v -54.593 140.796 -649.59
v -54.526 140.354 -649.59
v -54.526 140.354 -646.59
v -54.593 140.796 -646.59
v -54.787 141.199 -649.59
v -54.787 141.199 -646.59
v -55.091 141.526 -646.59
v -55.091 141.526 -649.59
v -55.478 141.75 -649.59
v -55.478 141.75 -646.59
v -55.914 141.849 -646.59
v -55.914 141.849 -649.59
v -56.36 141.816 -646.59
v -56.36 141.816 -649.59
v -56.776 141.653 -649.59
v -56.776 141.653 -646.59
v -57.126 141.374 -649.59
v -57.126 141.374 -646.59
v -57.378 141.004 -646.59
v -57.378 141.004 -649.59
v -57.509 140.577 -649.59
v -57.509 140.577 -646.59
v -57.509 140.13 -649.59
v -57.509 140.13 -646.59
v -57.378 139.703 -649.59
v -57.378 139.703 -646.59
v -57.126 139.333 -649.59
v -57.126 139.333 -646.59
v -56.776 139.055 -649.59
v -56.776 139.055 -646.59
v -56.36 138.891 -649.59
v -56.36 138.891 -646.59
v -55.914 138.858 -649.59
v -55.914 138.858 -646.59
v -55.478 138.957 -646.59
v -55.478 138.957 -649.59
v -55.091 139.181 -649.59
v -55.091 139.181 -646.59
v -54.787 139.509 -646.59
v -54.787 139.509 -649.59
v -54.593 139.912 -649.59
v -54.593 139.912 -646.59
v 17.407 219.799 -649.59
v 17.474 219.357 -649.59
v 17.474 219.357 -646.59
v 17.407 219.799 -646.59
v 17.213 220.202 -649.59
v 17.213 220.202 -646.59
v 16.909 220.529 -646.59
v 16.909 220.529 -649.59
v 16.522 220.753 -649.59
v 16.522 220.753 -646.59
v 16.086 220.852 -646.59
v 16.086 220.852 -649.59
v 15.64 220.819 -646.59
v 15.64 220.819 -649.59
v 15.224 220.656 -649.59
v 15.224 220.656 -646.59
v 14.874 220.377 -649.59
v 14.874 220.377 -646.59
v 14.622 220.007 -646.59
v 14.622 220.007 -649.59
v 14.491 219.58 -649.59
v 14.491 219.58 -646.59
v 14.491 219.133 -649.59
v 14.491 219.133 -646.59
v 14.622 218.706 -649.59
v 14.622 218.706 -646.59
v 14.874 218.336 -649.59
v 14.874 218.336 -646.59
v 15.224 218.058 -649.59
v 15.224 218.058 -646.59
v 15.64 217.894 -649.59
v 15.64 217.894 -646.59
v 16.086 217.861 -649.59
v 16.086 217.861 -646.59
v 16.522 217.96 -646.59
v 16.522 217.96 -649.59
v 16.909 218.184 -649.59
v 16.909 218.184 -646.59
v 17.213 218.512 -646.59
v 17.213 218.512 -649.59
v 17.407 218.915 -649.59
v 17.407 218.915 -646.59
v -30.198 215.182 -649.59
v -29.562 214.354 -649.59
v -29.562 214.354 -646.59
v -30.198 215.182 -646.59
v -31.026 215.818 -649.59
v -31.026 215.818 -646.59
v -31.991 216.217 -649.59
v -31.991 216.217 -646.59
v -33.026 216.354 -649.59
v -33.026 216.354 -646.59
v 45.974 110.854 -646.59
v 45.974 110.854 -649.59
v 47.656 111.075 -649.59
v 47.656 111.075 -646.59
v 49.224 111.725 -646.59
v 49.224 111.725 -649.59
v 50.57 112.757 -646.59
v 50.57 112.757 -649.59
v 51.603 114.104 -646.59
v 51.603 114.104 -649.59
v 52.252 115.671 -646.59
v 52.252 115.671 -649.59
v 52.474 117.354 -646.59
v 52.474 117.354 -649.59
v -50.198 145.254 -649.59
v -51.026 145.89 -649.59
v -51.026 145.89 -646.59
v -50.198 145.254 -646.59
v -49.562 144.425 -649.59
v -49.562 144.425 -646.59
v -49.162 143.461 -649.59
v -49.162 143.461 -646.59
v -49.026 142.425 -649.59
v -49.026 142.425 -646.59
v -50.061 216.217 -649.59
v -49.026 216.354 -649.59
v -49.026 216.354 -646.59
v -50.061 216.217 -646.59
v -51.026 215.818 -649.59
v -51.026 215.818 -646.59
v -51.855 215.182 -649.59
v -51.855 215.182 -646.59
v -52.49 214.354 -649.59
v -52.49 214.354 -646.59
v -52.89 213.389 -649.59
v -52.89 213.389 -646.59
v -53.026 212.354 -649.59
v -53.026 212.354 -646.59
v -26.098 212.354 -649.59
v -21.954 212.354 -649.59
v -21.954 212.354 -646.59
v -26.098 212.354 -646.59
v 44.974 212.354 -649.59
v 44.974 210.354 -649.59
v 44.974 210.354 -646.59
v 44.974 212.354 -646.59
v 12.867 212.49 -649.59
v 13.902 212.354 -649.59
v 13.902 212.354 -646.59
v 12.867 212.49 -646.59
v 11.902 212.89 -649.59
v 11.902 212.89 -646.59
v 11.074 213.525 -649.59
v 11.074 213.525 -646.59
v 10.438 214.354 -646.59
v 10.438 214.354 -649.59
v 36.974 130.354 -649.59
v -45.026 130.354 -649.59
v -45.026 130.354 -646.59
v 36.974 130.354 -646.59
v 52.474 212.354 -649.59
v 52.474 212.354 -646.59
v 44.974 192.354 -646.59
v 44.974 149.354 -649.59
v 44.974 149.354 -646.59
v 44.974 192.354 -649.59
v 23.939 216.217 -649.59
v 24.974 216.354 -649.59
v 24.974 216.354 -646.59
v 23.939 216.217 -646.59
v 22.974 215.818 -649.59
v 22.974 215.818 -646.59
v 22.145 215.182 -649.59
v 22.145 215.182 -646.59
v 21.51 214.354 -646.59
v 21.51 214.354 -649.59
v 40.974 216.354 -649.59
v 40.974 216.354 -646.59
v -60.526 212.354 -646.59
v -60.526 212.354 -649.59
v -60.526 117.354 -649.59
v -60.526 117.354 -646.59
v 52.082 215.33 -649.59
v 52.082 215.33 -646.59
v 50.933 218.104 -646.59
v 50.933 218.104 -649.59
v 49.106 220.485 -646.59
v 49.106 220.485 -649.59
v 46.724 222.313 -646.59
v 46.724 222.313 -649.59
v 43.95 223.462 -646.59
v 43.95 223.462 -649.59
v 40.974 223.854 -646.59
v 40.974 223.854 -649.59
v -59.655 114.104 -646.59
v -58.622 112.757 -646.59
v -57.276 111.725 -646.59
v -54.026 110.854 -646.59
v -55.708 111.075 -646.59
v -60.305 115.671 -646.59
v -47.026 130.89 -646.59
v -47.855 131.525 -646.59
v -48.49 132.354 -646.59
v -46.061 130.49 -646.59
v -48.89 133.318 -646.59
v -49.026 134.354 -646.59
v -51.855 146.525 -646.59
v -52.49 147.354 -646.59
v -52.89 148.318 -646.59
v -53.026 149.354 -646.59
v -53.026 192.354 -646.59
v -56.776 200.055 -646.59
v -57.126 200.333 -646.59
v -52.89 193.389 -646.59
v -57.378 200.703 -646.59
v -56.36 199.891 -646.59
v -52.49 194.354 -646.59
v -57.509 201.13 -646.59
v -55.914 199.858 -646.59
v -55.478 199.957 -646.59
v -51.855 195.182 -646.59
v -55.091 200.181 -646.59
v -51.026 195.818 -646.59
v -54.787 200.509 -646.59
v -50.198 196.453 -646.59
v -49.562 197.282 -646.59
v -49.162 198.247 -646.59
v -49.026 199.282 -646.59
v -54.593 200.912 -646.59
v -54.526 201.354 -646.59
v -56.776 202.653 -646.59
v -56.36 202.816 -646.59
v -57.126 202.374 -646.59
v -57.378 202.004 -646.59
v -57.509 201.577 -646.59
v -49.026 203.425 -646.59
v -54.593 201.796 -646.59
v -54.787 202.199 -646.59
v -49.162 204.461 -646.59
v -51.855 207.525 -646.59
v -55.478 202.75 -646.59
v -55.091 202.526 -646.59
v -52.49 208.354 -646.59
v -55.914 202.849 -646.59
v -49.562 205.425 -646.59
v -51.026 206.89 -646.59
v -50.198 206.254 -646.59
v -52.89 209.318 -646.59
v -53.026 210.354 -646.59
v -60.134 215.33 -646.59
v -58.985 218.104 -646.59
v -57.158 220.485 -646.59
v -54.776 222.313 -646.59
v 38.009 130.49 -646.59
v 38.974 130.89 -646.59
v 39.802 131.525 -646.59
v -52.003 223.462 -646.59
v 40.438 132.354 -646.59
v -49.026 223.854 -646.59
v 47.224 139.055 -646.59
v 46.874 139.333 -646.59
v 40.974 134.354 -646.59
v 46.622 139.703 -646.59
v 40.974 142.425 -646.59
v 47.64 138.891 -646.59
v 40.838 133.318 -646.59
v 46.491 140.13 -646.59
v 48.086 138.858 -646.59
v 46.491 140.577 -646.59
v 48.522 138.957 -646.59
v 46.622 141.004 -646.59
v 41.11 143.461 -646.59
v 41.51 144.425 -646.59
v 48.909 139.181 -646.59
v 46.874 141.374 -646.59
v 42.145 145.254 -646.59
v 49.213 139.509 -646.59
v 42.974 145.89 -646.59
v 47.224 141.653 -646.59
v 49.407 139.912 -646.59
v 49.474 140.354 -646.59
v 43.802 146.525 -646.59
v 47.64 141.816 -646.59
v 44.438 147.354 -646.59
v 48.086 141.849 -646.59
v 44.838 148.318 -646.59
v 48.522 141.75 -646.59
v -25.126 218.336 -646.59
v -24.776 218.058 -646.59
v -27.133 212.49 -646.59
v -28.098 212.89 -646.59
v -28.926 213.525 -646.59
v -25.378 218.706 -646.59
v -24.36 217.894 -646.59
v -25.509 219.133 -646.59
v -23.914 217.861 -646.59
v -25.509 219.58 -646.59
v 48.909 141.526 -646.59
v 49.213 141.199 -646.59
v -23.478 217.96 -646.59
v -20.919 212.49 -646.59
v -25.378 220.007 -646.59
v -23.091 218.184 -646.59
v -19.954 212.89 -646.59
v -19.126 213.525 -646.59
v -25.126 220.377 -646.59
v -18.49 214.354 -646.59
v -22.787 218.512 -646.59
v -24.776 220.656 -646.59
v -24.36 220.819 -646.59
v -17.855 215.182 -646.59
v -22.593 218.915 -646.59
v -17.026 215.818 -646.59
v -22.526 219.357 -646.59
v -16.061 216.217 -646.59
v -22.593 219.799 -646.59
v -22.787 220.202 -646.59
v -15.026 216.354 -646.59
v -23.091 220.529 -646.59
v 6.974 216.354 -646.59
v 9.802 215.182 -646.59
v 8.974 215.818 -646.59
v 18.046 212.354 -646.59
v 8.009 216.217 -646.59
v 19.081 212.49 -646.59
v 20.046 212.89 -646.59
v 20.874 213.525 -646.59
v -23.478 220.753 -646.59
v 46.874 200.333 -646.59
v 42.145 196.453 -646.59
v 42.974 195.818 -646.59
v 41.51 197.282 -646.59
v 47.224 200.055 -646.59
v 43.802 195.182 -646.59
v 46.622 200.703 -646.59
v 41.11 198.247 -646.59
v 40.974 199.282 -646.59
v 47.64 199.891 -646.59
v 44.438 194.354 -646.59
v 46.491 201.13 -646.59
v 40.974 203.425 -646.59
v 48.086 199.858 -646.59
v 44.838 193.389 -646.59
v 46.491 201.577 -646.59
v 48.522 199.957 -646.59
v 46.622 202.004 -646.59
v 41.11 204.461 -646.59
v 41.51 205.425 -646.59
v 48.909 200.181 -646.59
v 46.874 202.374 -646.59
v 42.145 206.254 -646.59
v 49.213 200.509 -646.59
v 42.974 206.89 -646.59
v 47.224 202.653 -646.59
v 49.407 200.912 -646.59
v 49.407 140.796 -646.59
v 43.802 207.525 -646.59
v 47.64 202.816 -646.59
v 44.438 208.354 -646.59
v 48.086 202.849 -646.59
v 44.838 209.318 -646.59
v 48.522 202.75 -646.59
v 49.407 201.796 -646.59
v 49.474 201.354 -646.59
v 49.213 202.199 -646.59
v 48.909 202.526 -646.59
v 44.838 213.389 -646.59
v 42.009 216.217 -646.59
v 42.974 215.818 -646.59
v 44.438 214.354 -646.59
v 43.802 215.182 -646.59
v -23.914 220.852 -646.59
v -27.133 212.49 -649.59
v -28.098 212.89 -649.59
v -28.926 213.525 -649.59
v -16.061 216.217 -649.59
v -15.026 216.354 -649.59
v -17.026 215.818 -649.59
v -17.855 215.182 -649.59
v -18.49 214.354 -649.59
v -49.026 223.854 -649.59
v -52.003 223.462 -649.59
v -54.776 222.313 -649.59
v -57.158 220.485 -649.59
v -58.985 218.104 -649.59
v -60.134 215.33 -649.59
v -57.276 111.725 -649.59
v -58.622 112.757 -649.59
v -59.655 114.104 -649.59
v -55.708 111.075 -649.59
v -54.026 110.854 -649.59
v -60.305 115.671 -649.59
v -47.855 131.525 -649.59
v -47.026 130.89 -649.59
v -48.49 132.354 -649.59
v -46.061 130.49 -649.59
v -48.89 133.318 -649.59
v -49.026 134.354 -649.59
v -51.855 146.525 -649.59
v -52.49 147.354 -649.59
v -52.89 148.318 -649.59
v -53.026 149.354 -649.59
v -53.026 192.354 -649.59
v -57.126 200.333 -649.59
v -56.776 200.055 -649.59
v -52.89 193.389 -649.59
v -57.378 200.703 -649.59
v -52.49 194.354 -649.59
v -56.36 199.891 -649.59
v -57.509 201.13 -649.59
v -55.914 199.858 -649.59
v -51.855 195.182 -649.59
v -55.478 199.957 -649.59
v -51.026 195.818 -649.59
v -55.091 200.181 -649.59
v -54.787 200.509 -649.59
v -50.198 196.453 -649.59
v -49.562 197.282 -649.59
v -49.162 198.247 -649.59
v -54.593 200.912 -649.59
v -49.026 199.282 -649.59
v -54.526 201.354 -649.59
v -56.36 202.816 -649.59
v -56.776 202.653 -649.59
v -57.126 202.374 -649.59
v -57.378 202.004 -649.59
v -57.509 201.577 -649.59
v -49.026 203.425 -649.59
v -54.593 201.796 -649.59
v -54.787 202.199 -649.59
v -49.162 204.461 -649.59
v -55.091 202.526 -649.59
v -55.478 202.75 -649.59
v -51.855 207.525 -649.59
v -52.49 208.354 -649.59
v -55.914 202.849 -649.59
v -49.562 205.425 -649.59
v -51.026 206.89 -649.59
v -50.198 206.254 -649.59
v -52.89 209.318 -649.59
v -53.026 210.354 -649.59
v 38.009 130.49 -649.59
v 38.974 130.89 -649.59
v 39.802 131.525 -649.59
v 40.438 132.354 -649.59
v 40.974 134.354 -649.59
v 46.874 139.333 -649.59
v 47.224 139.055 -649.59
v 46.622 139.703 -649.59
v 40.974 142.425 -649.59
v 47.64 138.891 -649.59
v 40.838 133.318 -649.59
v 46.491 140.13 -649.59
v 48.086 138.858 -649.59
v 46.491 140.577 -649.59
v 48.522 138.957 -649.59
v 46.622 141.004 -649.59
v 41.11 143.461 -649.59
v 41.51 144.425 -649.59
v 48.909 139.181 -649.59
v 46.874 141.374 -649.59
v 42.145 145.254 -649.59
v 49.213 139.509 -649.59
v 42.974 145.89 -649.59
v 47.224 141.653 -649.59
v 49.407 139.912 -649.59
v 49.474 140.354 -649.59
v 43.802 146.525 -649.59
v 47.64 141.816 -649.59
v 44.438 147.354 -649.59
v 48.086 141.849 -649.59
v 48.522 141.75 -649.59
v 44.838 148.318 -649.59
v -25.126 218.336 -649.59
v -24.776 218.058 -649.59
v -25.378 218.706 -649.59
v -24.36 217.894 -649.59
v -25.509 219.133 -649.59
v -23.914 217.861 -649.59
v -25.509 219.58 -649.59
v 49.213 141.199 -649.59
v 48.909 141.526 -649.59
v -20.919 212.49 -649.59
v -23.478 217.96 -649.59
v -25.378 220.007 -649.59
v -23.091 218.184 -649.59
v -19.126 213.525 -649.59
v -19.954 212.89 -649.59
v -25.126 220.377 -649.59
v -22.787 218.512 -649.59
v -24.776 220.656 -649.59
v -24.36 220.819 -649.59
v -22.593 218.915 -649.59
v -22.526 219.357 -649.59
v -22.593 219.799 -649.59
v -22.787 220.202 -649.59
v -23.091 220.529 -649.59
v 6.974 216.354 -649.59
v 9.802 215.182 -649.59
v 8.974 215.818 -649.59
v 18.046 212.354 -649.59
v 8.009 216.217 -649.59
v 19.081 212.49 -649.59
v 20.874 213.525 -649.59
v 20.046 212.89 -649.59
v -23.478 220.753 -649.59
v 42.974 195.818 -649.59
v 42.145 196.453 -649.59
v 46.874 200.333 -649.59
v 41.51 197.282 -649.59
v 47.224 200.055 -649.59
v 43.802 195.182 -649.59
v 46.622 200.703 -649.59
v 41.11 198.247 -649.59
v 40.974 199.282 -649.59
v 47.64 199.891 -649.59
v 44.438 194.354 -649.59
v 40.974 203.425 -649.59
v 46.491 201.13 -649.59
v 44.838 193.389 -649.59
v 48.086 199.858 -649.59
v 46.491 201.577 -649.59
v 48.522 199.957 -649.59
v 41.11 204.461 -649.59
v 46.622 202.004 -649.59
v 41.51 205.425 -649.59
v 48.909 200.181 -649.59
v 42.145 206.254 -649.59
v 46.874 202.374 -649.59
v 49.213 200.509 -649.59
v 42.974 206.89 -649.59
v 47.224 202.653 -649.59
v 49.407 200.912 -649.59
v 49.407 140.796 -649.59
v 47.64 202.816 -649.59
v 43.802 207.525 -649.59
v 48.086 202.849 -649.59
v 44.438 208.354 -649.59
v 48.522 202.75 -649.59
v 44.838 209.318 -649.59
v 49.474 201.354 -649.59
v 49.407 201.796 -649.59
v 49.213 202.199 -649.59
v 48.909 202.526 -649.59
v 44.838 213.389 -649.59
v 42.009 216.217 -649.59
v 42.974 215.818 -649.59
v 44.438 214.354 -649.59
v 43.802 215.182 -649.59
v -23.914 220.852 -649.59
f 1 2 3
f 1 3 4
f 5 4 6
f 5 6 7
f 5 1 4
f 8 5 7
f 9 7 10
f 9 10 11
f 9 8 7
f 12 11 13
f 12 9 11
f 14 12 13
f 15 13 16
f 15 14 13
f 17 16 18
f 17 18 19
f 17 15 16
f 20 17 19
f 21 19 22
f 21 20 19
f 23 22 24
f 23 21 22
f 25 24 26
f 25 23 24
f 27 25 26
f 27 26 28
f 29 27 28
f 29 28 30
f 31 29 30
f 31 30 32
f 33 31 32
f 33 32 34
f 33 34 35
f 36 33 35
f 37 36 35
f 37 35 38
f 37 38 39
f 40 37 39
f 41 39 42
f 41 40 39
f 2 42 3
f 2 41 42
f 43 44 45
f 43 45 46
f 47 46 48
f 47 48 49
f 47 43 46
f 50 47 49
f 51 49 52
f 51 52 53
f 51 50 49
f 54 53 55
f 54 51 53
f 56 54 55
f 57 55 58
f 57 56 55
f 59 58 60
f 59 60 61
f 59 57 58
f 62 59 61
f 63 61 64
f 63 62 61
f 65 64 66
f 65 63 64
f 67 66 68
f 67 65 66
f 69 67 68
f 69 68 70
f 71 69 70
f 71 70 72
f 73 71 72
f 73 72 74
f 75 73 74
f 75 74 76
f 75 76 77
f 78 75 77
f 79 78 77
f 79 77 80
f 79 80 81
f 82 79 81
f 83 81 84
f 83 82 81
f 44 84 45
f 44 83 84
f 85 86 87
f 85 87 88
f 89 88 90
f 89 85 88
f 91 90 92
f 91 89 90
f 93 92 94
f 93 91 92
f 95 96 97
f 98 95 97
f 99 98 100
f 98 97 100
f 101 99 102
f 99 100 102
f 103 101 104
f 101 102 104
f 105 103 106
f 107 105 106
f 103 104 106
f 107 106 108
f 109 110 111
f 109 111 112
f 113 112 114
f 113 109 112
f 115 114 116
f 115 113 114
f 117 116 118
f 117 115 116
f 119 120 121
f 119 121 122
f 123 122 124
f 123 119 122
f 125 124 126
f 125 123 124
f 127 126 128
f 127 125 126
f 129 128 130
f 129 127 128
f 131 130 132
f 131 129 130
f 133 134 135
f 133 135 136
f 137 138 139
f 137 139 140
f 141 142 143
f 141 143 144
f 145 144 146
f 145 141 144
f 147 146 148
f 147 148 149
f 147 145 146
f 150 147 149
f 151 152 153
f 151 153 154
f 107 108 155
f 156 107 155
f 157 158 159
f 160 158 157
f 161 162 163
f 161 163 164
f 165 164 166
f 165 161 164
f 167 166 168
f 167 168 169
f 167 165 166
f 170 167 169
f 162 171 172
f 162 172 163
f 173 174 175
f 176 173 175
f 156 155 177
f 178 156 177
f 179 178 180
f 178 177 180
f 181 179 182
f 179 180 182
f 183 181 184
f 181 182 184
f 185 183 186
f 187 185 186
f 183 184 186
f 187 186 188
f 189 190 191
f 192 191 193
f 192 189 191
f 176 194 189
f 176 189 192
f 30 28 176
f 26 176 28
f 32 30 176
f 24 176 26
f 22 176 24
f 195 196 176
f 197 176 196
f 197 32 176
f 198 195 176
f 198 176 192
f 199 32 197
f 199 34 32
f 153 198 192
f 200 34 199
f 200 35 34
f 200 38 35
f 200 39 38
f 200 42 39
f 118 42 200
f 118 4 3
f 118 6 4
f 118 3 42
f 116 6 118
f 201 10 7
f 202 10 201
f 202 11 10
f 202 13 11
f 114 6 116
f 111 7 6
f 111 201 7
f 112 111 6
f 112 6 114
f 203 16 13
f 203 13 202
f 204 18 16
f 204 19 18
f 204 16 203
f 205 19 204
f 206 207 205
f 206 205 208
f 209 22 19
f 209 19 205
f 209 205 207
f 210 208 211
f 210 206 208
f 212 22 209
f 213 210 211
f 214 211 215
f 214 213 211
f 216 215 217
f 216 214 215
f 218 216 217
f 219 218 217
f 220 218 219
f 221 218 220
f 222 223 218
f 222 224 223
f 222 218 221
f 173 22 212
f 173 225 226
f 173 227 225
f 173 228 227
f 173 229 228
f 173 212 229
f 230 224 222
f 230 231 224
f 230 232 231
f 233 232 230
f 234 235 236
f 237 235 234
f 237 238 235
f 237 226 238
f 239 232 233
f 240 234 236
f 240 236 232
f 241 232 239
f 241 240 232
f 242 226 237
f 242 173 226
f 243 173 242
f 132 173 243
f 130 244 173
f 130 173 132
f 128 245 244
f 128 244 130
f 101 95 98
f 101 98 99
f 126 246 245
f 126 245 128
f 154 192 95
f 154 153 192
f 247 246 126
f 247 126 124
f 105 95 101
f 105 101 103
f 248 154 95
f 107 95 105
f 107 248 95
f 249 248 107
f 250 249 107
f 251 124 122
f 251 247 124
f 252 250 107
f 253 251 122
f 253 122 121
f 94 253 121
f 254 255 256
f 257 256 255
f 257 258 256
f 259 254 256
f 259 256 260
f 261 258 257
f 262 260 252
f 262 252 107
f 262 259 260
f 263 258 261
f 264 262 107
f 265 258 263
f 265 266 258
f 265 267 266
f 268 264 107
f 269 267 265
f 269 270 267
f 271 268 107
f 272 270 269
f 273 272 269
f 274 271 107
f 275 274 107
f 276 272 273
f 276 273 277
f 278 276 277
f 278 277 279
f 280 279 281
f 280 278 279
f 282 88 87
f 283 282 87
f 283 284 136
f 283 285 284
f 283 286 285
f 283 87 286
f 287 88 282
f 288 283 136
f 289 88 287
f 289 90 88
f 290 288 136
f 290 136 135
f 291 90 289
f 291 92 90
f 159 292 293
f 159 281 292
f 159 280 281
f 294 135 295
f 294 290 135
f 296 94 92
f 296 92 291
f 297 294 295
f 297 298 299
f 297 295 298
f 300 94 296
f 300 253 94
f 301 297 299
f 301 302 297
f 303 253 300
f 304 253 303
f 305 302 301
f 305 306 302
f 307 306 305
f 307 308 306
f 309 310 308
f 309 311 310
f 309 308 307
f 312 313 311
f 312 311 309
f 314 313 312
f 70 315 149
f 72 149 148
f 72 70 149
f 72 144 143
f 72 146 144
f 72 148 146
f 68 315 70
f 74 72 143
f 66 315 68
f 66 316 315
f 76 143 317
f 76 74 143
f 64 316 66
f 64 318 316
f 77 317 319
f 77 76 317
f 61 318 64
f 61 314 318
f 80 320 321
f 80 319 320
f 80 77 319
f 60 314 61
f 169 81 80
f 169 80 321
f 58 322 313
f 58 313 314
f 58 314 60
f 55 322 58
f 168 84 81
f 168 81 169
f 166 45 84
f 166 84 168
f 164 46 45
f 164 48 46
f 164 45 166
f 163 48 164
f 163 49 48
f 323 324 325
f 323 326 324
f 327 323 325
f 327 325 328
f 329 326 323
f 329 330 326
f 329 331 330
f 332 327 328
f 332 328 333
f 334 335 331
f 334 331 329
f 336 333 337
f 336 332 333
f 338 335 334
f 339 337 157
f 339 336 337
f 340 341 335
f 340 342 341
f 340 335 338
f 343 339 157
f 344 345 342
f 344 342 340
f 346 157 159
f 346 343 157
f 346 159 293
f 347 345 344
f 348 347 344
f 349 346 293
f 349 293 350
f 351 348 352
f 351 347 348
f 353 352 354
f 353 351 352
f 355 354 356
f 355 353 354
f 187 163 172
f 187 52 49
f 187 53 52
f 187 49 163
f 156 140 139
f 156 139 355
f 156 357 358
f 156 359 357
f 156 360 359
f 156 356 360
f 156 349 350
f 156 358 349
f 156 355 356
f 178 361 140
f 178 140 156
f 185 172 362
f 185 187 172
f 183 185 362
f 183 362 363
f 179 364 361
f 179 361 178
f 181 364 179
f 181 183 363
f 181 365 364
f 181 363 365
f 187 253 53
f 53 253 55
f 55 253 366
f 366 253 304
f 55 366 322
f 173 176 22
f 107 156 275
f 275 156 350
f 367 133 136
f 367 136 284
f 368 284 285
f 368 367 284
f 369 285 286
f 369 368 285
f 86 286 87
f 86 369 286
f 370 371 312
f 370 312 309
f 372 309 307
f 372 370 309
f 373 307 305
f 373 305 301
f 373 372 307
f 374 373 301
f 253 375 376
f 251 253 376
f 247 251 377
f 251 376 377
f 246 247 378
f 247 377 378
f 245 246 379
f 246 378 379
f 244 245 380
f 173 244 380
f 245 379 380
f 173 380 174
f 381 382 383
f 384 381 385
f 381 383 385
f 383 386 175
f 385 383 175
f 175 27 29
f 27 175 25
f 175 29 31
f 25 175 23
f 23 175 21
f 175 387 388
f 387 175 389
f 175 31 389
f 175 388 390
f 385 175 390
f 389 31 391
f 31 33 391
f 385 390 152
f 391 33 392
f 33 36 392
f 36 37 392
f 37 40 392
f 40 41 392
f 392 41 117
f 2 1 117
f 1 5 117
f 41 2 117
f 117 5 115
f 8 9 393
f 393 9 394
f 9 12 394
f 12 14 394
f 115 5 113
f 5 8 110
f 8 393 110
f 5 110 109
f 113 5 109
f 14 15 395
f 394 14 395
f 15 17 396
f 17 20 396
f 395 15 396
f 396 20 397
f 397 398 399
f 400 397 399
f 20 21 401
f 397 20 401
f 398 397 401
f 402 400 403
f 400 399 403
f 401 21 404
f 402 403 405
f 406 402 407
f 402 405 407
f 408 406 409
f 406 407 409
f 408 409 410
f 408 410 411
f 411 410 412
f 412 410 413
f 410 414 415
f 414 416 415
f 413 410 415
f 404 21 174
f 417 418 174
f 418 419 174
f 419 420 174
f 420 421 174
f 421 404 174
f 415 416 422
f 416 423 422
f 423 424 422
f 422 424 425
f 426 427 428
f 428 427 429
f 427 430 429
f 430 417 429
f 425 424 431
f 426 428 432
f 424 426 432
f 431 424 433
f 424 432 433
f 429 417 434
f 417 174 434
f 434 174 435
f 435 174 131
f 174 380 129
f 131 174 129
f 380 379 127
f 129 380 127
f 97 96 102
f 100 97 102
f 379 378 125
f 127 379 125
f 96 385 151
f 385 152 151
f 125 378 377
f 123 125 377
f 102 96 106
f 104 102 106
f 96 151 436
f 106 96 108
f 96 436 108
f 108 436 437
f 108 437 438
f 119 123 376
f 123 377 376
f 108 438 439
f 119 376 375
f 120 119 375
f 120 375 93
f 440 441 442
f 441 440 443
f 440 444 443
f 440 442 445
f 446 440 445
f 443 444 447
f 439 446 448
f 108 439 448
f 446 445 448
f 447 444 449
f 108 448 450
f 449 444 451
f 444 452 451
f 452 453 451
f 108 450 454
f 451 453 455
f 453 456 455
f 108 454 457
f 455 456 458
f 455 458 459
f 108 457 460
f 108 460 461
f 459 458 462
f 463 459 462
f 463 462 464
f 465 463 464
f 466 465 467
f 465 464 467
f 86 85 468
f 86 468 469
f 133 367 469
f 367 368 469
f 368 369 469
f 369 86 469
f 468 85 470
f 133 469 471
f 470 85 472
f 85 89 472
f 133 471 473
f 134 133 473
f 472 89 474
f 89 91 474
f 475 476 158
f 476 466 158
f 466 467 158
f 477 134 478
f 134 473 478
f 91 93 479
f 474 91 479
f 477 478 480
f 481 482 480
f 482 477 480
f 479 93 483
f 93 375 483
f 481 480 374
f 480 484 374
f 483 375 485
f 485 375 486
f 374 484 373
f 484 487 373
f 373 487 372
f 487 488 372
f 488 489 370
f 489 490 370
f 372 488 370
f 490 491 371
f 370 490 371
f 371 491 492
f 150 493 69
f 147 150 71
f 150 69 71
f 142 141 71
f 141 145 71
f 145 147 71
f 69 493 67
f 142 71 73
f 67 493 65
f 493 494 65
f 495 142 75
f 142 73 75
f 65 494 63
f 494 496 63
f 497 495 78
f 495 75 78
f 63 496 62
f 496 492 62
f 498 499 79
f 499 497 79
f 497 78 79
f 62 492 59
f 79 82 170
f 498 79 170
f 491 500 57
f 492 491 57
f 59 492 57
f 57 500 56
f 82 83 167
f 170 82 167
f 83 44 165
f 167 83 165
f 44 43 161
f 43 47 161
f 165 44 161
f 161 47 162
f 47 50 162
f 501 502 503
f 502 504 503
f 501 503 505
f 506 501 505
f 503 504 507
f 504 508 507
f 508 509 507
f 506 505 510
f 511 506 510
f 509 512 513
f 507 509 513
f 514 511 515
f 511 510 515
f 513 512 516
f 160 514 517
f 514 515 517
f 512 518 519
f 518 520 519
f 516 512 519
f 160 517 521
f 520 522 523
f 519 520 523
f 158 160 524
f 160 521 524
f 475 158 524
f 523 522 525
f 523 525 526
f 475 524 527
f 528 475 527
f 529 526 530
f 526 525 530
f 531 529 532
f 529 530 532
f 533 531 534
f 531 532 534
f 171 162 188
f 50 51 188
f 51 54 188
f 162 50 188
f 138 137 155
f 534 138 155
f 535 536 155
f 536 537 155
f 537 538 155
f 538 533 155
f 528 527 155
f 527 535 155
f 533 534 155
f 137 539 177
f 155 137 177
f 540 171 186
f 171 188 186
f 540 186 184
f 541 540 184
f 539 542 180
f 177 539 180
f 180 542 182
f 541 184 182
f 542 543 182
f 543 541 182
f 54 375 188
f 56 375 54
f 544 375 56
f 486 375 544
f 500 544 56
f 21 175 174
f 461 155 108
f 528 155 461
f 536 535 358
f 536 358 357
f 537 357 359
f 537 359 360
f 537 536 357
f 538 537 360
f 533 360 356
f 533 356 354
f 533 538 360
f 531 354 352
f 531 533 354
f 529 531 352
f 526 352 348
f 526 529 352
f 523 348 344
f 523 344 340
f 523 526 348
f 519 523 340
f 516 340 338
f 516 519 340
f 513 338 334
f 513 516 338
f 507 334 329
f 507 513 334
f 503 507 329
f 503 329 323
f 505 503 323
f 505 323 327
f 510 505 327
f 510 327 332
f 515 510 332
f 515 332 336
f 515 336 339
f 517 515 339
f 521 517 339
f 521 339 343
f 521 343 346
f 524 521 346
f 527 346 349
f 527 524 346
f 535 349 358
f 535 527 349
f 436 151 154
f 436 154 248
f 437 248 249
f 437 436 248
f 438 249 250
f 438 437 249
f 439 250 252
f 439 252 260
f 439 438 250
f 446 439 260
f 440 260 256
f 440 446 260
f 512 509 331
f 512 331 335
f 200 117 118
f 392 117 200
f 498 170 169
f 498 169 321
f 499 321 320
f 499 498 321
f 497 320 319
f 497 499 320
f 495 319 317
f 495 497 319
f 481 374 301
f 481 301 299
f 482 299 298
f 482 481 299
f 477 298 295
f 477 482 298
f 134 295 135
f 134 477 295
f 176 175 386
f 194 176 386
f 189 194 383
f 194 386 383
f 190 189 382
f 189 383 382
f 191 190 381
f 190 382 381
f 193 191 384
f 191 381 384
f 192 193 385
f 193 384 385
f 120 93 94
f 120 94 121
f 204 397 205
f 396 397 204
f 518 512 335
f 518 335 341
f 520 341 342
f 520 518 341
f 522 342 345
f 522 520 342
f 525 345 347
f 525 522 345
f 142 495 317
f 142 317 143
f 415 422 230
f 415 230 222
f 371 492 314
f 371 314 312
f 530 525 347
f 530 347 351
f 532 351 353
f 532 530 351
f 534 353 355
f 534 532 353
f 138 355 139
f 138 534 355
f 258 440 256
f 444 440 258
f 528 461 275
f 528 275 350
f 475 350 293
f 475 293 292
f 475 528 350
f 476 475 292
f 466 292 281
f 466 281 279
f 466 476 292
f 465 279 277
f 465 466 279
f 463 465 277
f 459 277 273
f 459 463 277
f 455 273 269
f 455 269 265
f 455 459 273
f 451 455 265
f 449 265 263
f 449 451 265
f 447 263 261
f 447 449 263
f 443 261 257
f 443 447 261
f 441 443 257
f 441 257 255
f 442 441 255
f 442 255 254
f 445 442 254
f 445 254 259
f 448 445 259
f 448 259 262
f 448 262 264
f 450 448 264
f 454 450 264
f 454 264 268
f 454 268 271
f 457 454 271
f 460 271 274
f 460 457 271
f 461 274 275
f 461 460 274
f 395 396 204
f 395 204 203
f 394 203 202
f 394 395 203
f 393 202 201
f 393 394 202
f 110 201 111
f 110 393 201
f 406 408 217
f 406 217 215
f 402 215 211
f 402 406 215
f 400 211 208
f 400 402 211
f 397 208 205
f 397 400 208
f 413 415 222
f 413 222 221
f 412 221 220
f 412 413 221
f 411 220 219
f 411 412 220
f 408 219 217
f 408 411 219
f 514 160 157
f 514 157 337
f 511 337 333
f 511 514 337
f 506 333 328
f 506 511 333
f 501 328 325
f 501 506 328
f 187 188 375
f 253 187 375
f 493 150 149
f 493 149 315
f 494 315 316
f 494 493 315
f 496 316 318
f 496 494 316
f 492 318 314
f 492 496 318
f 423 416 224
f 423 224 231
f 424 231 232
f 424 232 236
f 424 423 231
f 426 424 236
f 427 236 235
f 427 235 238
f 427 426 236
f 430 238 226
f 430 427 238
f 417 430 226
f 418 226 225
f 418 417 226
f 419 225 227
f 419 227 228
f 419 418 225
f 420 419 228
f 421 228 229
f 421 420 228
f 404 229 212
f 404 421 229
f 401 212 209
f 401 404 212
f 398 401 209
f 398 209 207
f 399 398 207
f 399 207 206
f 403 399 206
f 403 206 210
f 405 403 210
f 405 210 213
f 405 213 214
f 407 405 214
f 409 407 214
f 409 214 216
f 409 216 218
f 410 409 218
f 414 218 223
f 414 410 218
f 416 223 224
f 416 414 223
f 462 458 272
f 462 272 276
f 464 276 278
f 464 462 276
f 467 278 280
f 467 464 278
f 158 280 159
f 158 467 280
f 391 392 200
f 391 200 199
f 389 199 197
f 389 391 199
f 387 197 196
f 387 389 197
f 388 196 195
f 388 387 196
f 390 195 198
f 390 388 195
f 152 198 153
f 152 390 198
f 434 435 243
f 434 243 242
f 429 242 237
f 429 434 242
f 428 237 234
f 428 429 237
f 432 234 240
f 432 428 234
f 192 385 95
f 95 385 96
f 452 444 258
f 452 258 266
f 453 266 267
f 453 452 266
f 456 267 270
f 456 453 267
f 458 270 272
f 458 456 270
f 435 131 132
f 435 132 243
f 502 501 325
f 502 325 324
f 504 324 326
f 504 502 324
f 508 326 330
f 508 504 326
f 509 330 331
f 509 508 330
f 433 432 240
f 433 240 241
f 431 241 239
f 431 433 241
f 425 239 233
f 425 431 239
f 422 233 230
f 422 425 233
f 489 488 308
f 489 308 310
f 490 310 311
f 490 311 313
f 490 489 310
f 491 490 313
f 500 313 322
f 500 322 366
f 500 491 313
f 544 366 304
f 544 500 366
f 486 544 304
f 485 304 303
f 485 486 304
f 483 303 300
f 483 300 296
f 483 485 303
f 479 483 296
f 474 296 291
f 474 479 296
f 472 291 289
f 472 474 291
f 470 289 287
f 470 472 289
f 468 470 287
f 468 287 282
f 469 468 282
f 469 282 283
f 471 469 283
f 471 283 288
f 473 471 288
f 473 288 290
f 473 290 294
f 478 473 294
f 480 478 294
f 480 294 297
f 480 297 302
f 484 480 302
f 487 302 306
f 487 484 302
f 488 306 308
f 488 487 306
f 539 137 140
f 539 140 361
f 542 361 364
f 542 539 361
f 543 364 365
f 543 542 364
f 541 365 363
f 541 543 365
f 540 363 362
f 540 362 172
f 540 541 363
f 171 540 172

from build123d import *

# Parameters (mm, degrees)
SKETCH2_R           = 1.5
BOSS_EXTRUDE4_DEPTH = 3


with BuildPart() as part:
    # Sketch2 → Boss-Extrude4 (new body)
    with BuildSketch(Plane.XY.offset(-649.589603716)):
        with BuildLine():
            Line((40.97386422, 223.853671966), (-49.02613578, 223.853671966))
            ThreePointArc((-49.02613578, 223.853671966), (-57.157863764, 220.48539995), (-60.52613578, 212.353671966))
            Line((-60.52613578, 212.353671966), (-60.52613578, 117.353671966))
            ThreePointArc((-60.52613578, 117.353671966), (-58.622329858, 112.757477888), (-54.02613578, 110.853671966))
            Line((-54.02613578, 110.853671966), (45.97386422, 110.853671966))
            ThreePointArc((45.97386422, 110.853671966), (50.570058297, 112.757477888), (52.47386422, 117.353671966))
            Line((52.47386422, 117.353671966), (52.47386422, 212.353671966))
            ThreePointArc((52.47386422, 212.353671966), (49.105592203, 220.48539995), (40.97386422, 223.853671966))
        make_face()
        with Locations((-56.02613578, 201.353671966)):
            Circle(SKETCH2_R, mode=Mode.SUBTRACT)
        with Locations((-24.02613578, 219.356652382)):
            Circle(SKETCH2_R, mode=Mode.SUBTRACT)
        with Locations((15.97386422, 219.356652382)):
            Circle(SKETCH2_R, mode=Mode.SUBTRACT)
        with Locations((47.97386422, 201.353671966)):
            Circle(SKETCH2_R, mode=Mode.SUBTRACT)
        with Locations((47.97386422, 140.353671966)):
            Circle(SKETCH2_R, mode=Mode.SUBTRACT)
        with Locations((-56.02613578, 140.353671966)):
            Circle(SKETCH2_R, mode=Mode.SUBTRACT)
        with BuildLine():
            Line((-53.02613578, 192.353671966), (-53.02613578, 162.353671966))
            Line((-53.02613578, 162.353671966), (-53.02613578, 149.353671966))
            ThreePointArc((-53.02613578, 149.353671966), (-52.490237396, 147.353671966), (-51.02613578, 145.889570351))
            ThreePointArc((-51.02613578, 145.889570351), (-49.562034165, 144.425468736), (-49.02613578, 142.425468736))
            Line((-49.02613578, 142.425468736), (-49.02613578, 134.353671966))
            ThreePointArc((-49.02613578, 134.353671966), (-47.854562905, 131.525244841), (-45.02613578, 130.353671966))
            Line((-45.02613578, 130.353671966), (36.97386422, 130.353671966))
            ThreePointArc((36.97386422, 130.353671966), (39.802291344, 131.525244841), (40.97386422, 134.353671966))
            Line((40.97386422, 134.353671966), (40.97386422, 142.425468736))
            ThreePointArc((40.97386422, 142.425468736), (41.509762604, 144.425468736), (42.97386422, 145.889570351))
            ThreePointArc((42.97386422, 145.889570351), (44.437965835, 147.353671966), (44.97386422, 149.353671966))
            Line((44.97386422, 149.353671966), (44.97386422, 192.353671966))
            ThreePointArc((44.97386422, 192.353671966), (44.437965835, 194.353671966), (42.97386422, 195.817773581))
            ThreePointArc((42.97386422, 195.817773581), (41.509762604, 197.281875196), (40.97386422, 199.281875196))
            Line((40.97386422, 199.281875196), (40.97386422, 203.425468736))
            ThreePointArc((40.97386422, 203.425468736), (41.509762604, 205.425468736), (42.97386422, 206.889570351))
            ThreePointArc((42.97386422, 206.889570351), (44.437965835, 208.353671966), (44.97386422, 210.353671966))
            Line((44.97386422, 210.353671966), (44.97386422, 212.353671966))
            ThreePointArc((44.97386422, 212.353671966), (43.802291344, 215.182099091), (40.97386422, 216.353671966))
            Line((40.97386422, 216.353671966), (24.97386422, 216.353671966))
            ThreePointArc((24.97386422, 216.353671966), (22.97386422, 215.817773581), (21.509762604, 214.353671966))
            ThreePointArc((21.509762604, 214.353671966), (20.045660989, 212.889570351), (18.045660989, 212.353671966))
            Line((18.045660989, 212.353671966), (13.90206745, 212.353671966))
            ThreePointArc((13.90206745, 212.353671966), (11.90206745, 212.889570351), (10.437965835, 214.353671966))
            ThreePointArc((10.437965835, 214.353671966), (8.97386422, 215.817773581), (6.97386422, 216.353671966))
            Line((6.97386422, 216.353671966), (-15.02613578, 216.353671966))
            ThreePointArc((-15.02613578, 216.353671966), (-17.02613578, 215.817773581), (-18.490237396, 214.353671966))
            ThreePointArc((-18.490237396, 214.353671966), (-19.954339011, 212.889570351), (-21.954339011, 212.353671966))
            Line((-21.954339011, 212.353671966), (-26.09793255, 212.353671966))
            ThreePointArc((-26.09793255, 212.353671966), (-28.09793255, 212.889570351), (-29.562034165, 214.353671966))
            ThreePointArc((-29.562034165, 214.353671966), (-31.02613578, 215.817773581), (-33.02613578, 216.353671966))
            Line((-33.02613578, 216.353671966), (-49.02613578, 216.353671966))
            ThreePointArc((-49.02613578, 216.353671966), (-51.854562905, 215.182099091), (-53.02613578, 212.353671966))
            Line((-53.02613578, 212.353671966), (-53.02613578, 210.353671966))
            ThreePointArc((-53.02613578, 210.353671966), (-52.490237396, 208.353671966), (-51.02613578, 206.889570351))
            ThreePointArc((-51.02613578, 206.889570351), (-49.562034165, 205.425468736), (-49.02613578, 203.425468736))
            Line((-49.02613578, 203.425468736), (-49.02613578, 199.281875196))
            ThreePointArc((-49.02613578, 199.281875196), (-49.562034165, 197.281875196), (-51.02613578, 195.817773581))
            ThreePointArc((-51.02613578, 195.817773581), (-52.490237396, 194.353671966), (-53.02613578, 192.353671966))
        make_face(mode=Mode.SUBTRACT)
    extrude(amount=BOSS_EXTRUDE4_DEPTH)


solid = part.part
